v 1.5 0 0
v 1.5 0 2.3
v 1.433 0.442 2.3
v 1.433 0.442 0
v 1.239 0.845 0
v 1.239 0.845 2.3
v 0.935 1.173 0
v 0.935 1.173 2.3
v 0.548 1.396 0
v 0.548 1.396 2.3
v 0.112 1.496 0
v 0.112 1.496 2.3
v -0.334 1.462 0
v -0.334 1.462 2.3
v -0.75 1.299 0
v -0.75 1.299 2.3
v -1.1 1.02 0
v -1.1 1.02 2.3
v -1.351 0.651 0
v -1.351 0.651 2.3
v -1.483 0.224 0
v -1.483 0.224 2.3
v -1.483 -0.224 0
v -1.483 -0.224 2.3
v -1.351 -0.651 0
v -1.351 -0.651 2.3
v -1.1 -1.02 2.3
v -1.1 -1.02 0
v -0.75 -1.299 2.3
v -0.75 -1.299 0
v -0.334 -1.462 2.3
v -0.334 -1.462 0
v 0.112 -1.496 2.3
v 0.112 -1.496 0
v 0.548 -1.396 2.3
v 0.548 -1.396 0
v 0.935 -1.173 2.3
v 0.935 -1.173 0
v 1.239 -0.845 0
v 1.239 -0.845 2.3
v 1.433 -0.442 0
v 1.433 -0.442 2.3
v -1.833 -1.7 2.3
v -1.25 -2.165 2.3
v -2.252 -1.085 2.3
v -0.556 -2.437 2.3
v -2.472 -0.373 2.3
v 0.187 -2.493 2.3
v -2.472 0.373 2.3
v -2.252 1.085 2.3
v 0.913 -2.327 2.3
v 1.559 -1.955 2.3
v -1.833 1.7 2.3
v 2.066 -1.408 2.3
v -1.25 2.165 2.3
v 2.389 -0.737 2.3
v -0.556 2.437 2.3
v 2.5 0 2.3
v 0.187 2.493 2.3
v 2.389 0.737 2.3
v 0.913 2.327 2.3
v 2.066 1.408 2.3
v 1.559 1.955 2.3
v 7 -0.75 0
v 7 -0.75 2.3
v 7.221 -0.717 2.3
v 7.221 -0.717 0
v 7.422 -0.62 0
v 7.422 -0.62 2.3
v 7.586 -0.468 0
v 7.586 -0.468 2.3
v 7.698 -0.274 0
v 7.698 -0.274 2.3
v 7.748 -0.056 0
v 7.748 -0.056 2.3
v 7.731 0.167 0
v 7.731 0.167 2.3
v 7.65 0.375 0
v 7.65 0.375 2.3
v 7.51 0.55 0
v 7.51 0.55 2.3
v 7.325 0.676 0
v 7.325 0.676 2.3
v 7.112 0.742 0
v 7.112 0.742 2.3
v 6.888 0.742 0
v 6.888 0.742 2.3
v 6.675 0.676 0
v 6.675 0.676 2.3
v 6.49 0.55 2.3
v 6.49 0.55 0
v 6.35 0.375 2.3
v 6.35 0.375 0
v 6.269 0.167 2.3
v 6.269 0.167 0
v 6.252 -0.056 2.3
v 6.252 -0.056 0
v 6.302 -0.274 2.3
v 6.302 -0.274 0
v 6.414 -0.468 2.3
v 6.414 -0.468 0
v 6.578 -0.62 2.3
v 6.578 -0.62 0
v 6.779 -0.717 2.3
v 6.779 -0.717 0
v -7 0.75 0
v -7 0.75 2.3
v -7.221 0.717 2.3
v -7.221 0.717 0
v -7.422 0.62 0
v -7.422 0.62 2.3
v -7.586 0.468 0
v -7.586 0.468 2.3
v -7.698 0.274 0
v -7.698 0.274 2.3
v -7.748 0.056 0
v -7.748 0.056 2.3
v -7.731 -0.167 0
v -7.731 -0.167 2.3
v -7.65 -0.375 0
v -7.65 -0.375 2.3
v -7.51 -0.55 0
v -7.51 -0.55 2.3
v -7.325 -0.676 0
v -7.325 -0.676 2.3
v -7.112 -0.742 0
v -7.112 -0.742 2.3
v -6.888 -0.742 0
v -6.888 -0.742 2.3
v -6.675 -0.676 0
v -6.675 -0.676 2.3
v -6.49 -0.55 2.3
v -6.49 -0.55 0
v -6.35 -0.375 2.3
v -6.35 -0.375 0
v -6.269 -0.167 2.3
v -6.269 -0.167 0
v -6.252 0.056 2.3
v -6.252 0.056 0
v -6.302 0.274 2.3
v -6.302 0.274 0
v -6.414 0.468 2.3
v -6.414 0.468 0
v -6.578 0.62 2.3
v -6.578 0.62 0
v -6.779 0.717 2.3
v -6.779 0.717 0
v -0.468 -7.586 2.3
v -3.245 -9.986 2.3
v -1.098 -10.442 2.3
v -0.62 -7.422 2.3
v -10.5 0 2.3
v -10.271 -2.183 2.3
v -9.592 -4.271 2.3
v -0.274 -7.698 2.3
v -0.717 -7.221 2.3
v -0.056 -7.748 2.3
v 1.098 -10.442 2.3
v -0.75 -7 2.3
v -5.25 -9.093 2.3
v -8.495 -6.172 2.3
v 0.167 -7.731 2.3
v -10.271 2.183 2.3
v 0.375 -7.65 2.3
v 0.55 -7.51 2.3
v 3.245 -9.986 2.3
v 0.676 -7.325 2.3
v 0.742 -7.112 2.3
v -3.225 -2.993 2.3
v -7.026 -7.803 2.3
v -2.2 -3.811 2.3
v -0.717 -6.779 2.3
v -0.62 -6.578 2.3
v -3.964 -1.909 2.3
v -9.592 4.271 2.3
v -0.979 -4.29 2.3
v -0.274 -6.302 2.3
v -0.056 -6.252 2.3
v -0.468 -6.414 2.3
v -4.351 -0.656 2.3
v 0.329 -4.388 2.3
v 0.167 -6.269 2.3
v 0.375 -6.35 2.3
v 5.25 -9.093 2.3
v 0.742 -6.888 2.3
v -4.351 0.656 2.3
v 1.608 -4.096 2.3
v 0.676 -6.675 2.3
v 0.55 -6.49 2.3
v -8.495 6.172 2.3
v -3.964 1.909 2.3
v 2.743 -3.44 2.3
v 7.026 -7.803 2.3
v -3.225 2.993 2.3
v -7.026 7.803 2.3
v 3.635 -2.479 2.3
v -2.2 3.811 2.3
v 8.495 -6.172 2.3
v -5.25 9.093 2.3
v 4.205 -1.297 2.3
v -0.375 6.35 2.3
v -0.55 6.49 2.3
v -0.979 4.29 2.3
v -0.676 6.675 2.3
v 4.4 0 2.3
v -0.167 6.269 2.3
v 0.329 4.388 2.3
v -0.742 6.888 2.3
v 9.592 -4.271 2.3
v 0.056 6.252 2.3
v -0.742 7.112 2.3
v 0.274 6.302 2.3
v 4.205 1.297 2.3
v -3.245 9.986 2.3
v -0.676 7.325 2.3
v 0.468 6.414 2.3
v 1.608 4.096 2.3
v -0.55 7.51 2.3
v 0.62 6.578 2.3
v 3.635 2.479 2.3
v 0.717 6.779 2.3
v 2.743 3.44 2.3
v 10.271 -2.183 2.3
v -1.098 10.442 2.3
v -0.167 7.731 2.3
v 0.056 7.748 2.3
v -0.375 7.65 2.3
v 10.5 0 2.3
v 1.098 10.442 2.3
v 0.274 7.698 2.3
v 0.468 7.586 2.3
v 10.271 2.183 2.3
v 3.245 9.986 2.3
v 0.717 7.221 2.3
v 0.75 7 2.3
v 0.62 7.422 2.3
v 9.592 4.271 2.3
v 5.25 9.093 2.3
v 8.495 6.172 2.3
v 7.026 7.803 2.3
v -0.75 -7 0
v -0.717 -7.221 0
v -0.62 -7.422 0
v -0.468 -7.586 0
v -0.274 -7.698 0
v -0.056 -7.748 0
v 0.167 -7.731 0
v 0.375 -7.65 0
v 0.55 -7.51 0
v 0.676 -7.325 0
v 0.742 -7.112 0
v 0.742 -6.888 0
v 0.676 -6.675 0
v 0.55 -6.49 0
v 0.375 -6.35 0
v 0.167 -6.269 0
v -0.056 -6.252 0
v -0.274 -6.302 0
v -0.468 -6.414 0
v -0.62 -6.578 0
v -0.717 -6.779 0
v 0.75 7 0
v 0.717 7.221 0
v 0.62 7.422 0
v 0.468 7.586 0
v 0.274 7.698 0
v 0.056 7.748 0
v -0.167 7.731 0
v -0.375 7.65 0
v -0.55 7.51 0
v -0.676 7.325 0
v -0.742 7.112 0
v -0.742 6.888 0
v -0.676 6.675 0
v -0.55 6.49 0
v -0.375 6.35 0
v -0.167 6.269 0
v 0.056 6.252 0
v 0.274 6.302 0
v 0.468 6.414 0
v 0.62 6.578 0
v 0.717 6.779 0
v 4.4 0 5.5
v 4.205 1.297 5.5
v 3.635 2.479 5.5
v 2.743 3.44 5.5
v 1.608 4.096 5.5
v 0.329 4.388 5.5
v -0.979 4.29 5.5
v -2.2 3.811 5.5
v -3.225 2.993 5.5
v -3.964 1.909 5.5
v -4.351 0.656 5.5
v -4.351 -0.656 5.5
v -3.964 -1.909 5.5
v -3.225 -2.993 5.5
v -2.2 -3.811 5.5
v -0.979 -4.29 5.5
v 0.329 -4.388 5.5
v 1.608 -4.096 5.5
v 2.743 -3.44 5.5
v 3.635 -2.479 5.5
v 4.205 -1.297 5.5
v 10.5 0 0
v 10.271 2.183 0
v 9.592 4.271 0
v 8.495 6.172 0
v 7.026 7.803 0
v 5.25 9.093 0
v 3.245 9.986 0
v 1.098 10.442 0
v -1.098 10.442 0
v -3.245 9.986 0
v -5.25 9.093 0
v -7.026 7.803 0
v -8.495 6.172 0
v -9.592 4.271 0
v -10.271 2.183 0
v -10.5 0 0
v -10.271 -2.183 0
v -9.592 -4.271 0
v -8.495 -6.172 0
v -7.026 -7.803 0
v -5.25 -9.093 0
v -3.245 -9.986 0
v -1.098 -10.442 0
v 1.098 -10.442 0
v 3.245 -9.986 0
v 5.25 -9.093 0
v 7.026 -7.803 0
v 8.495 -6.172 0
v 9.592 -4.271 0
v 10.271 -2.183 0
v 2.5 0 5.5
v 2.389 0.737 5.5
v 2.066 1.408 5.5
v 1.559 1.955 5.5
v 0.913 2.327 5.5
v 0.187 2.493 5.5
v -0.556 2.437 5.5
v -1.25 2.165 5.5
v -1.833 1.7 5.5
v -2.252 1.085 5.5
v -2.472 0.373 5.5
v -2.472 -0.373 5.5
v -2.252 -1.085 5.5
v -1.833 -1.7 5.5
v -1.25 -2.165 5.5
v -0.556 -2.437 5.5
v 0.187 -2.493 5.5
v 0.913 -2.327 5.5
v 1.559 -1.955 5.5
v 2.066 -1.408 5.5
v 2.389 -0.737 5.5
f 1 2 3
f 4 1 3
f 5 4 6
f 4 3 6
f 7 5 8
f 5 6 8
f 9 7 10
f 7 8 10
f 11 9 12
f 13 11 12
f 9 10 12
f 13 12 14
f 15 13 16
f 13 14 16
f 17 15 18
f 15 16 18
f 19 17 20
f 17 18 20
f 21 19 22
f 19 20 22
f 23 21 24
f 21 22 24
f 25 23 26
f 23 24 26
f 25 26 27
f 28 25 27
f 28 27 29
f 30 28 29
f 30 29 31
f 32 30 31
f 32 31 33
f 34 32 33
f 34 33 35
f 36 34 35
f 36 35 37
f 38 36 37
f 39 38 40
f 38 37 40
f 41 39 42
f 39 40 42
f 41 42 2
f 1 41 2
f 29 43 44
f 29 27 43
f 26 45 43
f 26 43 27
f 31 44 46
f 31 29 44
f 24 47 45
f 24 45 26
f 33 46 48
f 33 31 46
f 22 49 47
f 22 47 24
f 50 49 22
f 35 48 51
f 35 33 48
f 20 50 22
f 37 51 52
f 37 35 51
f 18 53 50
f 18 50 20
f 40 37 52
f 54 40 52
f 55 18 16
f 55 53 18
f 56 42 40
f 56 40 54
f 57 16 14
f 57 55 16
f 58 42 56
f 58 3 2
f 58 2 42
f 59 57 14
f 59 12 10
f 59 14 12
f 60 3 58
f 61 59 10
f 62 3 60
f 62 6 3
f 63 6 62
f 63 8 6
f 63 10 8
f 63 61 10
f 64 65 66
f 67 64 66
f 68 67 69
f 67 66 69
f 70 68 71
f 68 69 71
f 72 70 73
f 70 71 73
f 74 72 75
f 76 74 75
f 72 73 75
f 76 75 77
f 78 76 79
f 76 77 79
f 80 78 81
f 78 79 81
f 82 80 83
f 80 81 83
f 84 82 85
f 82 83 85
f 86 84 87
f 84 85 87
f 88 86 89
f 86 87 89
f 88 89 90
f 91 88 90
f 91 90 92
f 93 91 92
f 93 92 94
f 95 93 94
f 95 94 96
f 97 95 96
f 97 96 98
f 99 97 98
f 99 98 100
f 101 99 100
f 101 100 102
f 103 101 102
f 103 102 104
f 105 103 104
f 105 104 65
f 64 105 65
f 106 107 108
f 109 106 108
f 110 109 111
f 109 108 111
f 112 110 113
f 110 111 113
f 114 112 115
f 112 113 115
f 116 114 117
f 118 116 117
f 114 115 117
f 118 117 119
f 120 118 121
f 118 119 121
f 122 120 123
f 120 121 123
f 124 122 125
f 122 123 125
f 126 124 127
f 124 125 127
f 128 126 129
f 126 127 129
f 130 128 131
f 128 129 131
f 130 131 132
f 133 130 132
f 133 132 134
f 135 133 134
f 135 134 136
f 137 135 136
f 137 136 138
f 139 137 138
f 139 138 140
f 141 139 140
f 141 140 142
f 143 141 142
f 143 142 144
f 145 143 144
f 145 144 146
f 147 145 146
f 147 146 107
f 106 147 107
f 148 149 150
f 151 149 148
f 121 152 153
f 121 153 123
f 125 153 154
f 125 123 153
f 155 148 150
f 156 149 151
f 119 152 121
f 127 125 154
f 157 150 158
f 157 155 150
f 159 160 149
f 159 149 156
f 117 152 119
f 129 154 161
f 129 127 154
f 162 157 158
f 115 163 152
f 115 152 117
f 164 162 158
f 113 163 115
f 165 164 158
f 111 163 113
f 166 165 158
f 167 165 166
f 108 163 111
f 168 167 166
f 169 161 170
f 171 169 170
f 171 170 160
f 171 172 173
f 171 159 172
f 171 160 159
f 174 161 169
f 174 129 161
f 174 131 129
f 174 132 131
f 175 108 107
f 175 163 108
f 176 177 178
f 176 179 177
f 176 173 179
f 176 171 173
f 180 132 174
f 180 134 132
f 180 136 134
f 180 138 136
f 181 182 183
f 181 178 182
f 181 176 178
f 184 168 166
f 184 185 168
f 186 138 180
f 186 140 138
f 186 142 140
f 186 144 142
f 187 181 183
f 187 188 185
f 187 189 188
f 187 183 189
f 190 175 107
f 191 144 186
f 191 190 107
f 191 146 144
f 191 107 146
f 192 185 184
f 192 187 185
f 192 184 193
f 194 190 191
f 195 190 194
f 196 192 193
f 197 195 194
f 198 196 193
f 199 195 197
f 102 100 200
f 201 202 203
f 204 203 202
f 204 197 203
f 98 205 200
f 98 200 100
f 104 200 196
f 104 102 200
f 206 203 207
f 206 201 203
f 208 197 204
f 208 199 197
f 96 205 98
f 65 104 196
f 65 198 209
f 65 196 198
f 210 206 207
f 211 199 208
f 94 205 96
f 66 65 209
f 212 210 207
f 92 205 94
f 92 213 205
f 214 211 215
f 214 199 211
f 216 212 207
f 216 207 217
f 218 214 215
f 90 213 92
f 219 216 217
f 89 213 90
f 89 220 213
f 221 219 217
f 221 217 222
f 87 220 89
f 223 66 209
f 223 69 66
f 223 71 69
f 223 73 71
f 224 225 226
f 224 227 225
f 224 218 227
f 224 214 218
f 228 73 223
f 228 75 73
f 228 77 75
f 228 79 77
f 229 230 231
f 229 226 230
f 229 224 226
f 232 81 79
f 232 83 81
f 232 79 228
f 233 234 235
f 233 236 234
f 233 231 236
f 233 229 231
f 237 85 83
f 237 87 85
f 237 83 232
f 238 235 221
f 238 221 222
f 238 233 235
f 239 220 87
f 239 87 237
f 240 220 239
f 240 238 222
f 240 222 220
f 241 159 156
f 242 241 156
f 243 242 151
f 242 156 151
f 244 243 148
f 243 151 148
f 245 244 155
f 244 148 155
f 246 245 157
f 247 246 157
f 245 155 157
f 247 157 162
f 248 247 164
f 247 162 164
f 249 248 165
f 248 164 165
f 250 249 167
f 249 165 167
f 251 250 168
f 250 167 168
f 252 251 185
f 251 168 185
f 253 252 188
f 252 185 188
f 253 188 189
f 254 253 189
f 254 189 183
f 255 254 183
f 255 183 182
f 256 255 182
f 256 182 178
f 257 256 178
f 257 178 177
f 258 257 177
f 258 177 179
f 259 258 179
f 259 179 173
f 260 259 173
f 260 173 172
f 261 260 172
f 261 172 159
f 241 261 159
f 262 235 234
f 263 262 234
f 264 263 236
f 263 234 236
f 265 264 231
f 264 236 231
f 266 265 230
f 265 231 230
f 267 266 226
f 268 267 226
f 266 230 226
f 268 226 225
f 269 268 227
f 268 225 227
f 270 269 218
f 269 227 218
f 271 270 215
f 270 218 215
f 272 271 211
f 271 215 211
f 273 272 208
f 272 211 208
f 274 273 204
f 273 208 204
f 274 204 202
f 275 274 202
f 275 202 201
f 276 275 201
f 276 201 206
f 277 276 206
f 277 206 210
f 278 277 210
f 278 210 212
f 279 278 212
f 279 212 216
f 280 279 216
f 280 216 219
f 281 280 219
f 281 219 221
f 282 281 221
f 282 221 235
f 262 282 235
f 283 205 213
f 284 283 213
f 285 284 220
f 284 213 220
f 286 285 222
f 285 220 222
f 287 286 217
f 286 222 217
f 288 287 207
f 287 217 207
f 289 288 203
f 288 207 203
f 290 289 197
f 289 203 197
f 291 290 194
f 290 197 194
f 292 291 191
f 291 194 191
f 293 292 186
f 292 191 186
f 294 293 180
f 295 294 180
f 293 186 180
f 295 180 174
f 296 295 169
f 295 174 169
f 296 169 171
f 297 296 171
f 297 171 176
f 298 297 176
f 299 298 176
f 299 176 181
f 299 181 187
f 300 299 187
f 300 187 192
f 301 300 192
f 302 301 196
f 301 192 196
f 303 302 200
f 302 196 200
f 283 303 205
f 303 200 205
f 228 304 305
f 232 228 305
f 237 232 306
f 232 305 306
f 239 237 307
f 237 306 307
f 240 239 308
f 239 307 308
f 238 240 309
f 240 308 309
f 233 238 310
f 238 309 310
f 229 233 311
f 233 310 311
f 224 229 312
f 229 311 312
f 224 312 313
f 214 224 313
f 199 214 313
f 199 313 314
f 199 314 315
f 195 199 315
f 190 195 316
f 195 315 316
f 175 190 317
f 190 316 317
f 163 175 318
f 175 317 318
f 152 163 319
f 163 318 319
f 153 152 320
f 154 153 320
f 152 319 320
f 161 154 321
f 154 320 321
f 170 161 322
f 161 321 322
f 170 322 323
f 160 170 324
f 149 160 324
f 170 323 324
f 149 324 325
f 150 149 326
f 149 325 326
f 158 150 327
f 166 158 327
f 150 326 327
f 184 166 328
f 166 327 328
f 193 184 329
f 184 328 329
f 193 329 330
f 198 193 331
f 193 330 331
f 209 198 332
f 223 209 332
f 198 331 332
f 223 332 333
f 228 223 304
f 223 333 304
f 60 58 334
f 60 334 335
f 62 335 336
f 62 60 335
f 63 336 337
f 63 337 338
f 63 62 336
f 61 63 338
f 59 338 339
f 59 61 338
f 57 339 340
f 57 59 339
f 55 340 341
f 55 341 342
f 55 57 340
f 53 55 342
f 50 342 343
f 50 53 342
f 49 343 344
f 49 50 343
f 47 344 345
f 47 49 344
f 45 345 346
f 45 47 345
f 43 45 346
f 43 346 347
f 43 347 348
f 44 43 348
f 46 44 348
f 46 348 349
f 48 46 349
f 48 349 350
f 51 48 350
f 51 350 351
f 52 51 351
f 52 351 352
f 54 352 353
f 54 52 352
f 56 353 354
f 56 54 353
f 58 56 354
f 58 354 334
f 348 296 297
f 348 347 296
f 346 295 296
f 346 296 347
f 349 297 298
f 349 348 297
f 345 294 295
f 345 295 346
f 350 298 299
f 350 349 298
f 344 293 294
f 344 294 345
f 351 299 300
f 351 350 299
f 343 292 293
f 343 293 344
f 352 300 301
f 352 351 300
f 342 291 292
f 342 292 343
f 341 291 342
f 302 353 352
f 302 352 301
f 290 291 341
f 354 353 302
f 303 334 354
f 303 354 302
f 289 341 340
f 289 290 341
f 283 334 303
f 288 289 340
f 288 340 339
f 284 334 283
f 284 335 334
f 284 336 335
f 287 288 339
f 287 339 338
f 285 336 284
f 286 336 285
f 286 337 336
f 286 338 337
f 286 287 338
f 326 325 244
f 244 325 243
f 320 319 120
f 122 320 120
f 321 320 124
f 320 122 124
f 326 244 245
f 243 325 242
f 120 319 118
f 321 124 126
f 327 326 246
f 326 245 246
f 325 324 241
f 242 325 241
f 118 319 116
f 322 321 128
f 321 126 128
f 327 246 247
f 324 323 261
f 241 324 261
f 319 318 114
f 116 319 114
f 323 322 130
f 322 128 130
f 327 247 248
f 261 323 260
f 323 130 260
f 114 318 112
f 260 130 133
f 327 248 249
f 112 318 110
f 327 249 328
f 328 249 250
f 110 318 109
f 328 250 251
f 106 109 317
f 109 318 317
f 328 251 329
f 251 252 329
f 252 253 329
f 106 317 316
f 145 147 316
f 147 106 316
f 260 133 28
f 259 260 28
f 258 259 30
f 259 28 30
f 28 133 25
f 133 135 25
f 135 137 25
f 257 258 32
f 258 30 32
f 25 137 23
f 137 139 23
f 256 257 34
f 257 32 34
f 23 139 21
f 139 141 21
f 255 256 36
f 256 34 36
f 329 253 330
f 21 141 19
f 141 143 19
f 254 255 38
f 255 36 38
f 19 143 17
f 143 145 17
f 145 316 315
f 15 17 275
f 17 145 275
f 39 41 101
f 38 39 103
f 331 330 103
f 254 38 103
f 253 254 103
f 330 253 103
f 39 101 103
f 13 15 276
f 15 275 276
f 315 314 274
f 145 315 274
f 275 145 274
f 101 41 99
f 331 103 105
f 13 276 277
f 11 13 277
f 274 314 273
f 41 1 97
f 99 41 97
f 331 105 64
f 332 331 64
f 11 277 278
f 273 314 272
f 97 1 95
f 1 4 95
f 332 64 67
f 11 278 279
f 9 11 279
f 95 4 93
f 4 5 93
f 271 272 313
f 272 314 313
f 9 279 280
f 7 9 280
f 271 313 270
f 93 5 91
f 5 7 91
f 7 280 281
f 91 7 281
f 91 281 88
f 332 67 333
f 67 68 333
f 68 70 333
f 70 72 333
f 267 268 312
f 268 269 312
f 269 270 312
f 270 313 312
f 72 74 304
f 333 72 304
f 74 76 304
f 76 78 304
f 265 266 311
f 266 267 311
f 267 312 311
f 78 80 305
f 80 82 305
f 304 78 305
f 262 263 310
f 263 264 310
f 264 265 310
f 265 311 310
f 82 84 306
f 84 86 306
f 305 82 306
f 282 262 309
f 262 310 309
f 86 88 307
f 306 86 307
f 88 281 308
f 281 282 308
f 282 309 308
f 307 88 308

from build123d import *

# Parameters (mm, degrees)
SKETCH1_R           = 10.5
BOSS_EXTRUDE1_DEPTH = 2.3
SKETCH2_R           = 0.75
CUT_EXTRUDE1_DEPTH  = 3.3
SKETCH3_R           = 1.5
CUT_EXTRUDE2_DEPTH  = 2.3
CIRPATTERN1_COUNT   = 4
SKETCH4_R           = 4.4
SKETCH4_R_2         = 2.5
BOSS_EXTRUDE2_DEPTH = 3.2


with BuildPart() as part:
    # Sketch1 → Boss-Extrude1 (new body)
    with BuildSketch(Plane.XY):
        Circle(SKETCH1_R)
    extrude(amount=BOSS_EXTRUDE1_DEPTH)

    # Sketch2 → Cut-Extrude1 (cut, through all)
    with BuildSketch(Plane.XY.offset(2.3)):
        with Locations((0, 7)):
            Circle(SKETCH2_R)
    cut_extrude1 = extrude(amount=-CUT_EXTRUDE1_DEPTH, mode=Mode.SUBTRACT)

    # Sketch3 → Cut-Extrude2 (cut)
    with BuildSketch(Plane.XY.offset(2.3)):
        Circle(SKETCH3_R)
    extrude(amount=-CUT_EXTRUDE2_DEPTH, mode=Mode.SUBTRACT)

    # CirPattern1: Cut-Extrude1 ×4 about axis
    cirpattern1_axis = Axis((0, 0, 0), (0, 0, 1))
    for i in range(1, CIRPATTERN1_COUNT):
        add(cut_extrude1.rotate(cirpattern1_axis, i * 360 / CIRPATTERN1_COUNT), mode=Mode.SUBTRACT)

    # Sketch4 → Boss-Extrude2 (add)
    with BuildSketch(Plane.XY.offset(2.3)):
        Circle(SKETCH4_R)
        Circle(SKETCH4_R_2, mode=Mode.SUBTRACT)
    extrude(amount=BOSS_EXTRUDE2_DEPTH)


solid = part.part
